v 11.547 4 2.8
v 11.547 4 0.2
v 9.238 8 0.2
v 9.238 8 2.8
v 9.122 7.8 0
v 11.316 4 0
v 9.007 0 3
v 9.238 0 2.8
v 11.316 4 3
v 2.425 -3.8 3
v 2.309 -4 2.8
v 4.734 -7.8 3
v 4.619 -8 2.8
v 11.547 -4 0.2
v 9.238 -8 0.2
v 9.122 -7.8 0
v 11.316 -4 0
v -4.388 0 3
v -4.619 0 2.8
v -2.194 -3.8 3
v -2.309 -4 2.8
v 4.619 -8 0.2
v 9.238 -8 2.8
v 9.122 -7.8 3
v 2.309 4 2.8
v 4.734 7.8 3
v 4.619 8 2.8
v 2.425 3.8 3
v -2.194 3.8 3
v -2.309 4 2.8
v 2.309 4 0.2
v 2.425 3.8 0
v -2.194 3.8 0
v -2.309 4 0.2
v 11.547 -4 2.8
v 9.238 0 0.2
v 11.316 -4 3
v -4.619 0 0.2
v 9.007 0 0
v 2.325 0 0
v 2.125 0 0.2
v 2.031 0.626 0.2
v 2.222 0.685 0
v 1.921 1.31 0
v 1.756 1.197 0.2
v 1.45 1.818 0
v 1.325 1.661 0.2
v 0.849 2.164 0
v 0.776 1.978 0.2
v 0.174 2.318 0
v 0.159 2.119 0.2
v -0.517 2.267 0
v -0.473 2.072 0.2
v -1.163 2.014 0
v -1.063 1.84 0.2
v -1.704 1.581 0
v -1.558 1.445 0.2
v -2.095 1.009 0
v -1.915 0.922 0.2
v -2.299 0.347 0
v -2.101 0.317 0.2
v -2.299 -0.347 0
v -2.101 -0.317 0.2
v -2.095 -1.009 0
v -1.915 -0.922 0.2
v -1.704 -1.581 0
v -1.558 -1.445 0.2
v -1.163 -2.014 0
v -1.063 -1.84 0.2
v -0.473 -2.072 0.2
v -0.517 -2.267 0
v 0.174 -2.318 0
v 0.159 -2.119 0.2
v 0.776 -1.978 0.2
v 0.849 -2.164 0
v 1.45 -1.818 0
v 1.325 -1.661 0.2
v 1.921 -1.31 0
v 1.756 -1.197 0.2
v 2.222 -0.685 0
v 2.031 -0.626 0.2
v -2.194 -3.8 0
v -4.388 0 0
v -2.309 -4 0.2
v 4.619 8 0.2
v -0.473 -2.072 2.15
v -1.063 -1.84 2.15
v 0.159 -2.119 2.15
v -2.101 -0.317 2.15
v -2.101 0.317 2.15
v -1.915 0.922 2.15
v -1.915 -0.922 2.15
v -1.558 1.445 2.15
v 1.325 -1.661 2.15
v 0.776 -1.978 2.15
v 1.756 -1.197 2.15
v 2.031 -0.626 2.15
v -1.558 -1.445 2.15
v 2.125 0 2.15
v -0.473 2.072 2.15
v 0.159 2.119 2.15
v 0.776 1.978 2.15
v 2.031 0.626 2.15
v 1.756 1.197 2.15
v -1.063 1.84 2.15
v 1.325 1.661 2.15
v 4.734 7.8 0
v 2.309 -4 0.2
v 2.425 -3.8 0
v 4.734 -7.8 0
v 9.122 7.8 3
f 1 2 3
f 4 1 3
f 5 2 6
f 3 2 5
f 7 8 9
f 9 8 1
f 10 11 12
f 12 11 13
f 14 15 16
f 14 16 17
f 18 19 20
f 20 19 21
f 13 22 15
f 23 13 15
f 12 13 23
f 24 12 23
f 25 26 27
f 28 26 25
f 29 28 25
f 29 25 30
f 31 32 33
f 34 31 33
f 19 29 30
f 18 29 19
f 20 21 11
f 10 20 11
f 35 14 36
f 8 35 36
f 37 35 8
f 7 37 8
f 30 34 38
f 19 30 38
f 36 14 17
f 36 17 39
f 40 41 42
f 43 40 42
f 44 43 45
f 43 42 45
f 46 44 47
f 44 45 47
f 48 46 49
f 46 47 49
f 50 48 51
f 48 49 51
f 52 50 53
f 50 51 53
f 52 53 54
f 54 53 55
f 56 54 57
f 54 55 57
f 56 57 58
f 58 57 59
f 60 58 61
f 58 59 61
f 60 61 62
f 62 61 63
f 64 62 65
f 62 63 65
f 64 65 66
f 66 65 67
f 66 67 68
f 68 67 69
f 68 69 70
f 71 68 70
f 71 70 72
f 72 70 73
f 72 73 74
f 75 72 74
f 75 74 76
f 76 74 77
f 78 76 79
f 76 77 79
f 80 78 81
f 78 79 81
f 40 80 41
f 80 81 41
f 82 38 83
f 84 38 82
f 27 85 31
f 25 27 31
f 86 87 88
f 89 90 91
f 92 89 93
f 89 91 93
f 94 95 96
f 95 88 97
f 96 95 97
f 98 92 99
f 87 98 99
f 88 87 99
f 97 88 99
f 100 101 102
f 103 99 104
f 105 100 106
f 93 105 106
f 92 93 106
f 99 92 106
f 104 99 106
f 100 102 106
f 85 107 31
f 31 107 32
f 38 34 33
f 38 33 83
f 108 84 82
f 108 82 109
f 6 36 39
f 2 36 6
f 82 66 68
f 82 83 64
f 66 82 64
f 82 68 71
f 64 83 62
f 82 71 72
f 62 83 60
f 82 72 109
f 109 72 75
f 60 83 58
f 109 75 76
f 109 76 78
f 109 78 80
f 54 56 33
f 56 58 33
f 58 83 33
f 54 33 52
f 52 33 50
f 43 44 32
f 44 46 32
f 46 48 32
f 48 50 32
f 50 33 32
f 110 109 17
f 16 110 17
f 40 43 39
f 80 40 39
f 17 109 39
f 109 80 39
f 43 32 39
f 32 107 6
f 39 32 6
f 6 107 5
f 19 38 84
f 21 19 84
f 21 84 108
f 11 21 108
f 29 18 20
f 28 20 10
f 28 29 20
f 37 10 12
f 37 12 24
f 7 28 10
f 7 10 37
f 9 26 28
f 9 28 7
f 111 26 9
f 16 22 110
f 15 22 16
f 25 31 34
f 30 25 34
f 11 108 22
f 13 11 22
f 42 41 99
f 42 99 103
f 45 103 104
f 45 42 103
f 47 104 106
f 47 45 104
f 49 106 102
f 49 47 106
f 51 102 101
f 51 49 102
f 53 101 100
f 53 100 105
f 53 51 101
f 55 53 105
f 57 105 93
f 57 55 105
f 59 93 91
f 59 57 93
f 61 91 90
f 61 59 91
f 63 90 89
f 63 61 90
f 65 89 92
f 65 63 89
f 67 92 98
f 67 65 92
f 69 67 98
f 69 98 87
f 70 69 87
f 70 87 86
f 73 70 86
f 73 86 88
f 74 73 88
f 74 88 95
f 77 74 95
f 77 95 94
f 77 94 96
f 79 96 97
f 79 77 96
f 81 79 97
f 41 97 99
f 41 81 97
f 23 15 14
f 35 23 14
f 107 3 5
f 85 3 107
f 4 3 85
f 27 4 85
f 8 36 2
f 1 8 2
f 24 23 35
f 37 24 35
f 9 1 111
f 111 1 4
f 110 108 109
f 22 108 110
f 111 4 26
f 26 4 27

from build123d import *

# Parameters (mm, degrees)
PAD_DEPTH       = 3
SKETCH001_R     = 2.125
POCKET_DEPTH    = 2.15
CHAMFER_SIZE    = 0.2
CHAMFER001_SIZE = 0.2


with BuildPart() as part:
    # Sketch → Pad (new body)
    with BuildSketch(Plane.XY):
        Polygon((2.309401, 4), (-2.309401, 4), (-4.618802, 0), (-2.309401, -4), (2.309401, -4), (4.618802, -8), (9.237604, -8), (11.547005, -4), (9.237604, 0), (11.547005, 4), (9.237604, 8), (4.618802, 8), align=None)
    extrude(amount=PAD_DEPTH)

    # Sketch001 → Pocket (cut)
    with BuildSketch(Plane.XY):
        Circle(SKETCH001_R)
    extrude(amount=POCKET_DEPTH, mode=Mode.SUBTRACT)

    # Chamfer
    chamfer_edges = [part.edges().sort_by_distance(p)[0] for p in [
        (0, 4, 3),
        (-3.464102, 2, 3),
        (-3.464102, -2, 3),
        (0, -4, 3),
        (3.464102, -6, 3),
        (6.928203, -8, 3),
        (10.392305, -6, 3),
        (10.392305, -2, 3),
        (10.392305, 2, 3),
        (10.392305, 6, 3),
        (6.928203, 8, 3),
        (3.464102, 6, 3),
    ]]
    chamfer(chamfer_edges, length=CHAMFER_SIZE)

    # Chamfer001
    chamfer001_edges = [part.edges().sort_by_distance(p)[0] for p in [
        (0, 4, 0),
        (3.464102, 6, 0),
        (-3.464102, 2, 0),
        (6.928203, 8, 0),
        (-3.464102, -2, 0),
        (10.392305, 6, 0),
        (0, -4, 0),
        (10.392305, 2, 0),
        (3.464102, -6, 0),
        (10.392305, -2, 0),
        (6.928203, -8, 0),
        (10.392305, -6, 0),
        (-2.125, 0, 0),
    ]]
    chamfer(chamfer001_edges, length=CHAMFER001_SIZE)


solid = part.part
